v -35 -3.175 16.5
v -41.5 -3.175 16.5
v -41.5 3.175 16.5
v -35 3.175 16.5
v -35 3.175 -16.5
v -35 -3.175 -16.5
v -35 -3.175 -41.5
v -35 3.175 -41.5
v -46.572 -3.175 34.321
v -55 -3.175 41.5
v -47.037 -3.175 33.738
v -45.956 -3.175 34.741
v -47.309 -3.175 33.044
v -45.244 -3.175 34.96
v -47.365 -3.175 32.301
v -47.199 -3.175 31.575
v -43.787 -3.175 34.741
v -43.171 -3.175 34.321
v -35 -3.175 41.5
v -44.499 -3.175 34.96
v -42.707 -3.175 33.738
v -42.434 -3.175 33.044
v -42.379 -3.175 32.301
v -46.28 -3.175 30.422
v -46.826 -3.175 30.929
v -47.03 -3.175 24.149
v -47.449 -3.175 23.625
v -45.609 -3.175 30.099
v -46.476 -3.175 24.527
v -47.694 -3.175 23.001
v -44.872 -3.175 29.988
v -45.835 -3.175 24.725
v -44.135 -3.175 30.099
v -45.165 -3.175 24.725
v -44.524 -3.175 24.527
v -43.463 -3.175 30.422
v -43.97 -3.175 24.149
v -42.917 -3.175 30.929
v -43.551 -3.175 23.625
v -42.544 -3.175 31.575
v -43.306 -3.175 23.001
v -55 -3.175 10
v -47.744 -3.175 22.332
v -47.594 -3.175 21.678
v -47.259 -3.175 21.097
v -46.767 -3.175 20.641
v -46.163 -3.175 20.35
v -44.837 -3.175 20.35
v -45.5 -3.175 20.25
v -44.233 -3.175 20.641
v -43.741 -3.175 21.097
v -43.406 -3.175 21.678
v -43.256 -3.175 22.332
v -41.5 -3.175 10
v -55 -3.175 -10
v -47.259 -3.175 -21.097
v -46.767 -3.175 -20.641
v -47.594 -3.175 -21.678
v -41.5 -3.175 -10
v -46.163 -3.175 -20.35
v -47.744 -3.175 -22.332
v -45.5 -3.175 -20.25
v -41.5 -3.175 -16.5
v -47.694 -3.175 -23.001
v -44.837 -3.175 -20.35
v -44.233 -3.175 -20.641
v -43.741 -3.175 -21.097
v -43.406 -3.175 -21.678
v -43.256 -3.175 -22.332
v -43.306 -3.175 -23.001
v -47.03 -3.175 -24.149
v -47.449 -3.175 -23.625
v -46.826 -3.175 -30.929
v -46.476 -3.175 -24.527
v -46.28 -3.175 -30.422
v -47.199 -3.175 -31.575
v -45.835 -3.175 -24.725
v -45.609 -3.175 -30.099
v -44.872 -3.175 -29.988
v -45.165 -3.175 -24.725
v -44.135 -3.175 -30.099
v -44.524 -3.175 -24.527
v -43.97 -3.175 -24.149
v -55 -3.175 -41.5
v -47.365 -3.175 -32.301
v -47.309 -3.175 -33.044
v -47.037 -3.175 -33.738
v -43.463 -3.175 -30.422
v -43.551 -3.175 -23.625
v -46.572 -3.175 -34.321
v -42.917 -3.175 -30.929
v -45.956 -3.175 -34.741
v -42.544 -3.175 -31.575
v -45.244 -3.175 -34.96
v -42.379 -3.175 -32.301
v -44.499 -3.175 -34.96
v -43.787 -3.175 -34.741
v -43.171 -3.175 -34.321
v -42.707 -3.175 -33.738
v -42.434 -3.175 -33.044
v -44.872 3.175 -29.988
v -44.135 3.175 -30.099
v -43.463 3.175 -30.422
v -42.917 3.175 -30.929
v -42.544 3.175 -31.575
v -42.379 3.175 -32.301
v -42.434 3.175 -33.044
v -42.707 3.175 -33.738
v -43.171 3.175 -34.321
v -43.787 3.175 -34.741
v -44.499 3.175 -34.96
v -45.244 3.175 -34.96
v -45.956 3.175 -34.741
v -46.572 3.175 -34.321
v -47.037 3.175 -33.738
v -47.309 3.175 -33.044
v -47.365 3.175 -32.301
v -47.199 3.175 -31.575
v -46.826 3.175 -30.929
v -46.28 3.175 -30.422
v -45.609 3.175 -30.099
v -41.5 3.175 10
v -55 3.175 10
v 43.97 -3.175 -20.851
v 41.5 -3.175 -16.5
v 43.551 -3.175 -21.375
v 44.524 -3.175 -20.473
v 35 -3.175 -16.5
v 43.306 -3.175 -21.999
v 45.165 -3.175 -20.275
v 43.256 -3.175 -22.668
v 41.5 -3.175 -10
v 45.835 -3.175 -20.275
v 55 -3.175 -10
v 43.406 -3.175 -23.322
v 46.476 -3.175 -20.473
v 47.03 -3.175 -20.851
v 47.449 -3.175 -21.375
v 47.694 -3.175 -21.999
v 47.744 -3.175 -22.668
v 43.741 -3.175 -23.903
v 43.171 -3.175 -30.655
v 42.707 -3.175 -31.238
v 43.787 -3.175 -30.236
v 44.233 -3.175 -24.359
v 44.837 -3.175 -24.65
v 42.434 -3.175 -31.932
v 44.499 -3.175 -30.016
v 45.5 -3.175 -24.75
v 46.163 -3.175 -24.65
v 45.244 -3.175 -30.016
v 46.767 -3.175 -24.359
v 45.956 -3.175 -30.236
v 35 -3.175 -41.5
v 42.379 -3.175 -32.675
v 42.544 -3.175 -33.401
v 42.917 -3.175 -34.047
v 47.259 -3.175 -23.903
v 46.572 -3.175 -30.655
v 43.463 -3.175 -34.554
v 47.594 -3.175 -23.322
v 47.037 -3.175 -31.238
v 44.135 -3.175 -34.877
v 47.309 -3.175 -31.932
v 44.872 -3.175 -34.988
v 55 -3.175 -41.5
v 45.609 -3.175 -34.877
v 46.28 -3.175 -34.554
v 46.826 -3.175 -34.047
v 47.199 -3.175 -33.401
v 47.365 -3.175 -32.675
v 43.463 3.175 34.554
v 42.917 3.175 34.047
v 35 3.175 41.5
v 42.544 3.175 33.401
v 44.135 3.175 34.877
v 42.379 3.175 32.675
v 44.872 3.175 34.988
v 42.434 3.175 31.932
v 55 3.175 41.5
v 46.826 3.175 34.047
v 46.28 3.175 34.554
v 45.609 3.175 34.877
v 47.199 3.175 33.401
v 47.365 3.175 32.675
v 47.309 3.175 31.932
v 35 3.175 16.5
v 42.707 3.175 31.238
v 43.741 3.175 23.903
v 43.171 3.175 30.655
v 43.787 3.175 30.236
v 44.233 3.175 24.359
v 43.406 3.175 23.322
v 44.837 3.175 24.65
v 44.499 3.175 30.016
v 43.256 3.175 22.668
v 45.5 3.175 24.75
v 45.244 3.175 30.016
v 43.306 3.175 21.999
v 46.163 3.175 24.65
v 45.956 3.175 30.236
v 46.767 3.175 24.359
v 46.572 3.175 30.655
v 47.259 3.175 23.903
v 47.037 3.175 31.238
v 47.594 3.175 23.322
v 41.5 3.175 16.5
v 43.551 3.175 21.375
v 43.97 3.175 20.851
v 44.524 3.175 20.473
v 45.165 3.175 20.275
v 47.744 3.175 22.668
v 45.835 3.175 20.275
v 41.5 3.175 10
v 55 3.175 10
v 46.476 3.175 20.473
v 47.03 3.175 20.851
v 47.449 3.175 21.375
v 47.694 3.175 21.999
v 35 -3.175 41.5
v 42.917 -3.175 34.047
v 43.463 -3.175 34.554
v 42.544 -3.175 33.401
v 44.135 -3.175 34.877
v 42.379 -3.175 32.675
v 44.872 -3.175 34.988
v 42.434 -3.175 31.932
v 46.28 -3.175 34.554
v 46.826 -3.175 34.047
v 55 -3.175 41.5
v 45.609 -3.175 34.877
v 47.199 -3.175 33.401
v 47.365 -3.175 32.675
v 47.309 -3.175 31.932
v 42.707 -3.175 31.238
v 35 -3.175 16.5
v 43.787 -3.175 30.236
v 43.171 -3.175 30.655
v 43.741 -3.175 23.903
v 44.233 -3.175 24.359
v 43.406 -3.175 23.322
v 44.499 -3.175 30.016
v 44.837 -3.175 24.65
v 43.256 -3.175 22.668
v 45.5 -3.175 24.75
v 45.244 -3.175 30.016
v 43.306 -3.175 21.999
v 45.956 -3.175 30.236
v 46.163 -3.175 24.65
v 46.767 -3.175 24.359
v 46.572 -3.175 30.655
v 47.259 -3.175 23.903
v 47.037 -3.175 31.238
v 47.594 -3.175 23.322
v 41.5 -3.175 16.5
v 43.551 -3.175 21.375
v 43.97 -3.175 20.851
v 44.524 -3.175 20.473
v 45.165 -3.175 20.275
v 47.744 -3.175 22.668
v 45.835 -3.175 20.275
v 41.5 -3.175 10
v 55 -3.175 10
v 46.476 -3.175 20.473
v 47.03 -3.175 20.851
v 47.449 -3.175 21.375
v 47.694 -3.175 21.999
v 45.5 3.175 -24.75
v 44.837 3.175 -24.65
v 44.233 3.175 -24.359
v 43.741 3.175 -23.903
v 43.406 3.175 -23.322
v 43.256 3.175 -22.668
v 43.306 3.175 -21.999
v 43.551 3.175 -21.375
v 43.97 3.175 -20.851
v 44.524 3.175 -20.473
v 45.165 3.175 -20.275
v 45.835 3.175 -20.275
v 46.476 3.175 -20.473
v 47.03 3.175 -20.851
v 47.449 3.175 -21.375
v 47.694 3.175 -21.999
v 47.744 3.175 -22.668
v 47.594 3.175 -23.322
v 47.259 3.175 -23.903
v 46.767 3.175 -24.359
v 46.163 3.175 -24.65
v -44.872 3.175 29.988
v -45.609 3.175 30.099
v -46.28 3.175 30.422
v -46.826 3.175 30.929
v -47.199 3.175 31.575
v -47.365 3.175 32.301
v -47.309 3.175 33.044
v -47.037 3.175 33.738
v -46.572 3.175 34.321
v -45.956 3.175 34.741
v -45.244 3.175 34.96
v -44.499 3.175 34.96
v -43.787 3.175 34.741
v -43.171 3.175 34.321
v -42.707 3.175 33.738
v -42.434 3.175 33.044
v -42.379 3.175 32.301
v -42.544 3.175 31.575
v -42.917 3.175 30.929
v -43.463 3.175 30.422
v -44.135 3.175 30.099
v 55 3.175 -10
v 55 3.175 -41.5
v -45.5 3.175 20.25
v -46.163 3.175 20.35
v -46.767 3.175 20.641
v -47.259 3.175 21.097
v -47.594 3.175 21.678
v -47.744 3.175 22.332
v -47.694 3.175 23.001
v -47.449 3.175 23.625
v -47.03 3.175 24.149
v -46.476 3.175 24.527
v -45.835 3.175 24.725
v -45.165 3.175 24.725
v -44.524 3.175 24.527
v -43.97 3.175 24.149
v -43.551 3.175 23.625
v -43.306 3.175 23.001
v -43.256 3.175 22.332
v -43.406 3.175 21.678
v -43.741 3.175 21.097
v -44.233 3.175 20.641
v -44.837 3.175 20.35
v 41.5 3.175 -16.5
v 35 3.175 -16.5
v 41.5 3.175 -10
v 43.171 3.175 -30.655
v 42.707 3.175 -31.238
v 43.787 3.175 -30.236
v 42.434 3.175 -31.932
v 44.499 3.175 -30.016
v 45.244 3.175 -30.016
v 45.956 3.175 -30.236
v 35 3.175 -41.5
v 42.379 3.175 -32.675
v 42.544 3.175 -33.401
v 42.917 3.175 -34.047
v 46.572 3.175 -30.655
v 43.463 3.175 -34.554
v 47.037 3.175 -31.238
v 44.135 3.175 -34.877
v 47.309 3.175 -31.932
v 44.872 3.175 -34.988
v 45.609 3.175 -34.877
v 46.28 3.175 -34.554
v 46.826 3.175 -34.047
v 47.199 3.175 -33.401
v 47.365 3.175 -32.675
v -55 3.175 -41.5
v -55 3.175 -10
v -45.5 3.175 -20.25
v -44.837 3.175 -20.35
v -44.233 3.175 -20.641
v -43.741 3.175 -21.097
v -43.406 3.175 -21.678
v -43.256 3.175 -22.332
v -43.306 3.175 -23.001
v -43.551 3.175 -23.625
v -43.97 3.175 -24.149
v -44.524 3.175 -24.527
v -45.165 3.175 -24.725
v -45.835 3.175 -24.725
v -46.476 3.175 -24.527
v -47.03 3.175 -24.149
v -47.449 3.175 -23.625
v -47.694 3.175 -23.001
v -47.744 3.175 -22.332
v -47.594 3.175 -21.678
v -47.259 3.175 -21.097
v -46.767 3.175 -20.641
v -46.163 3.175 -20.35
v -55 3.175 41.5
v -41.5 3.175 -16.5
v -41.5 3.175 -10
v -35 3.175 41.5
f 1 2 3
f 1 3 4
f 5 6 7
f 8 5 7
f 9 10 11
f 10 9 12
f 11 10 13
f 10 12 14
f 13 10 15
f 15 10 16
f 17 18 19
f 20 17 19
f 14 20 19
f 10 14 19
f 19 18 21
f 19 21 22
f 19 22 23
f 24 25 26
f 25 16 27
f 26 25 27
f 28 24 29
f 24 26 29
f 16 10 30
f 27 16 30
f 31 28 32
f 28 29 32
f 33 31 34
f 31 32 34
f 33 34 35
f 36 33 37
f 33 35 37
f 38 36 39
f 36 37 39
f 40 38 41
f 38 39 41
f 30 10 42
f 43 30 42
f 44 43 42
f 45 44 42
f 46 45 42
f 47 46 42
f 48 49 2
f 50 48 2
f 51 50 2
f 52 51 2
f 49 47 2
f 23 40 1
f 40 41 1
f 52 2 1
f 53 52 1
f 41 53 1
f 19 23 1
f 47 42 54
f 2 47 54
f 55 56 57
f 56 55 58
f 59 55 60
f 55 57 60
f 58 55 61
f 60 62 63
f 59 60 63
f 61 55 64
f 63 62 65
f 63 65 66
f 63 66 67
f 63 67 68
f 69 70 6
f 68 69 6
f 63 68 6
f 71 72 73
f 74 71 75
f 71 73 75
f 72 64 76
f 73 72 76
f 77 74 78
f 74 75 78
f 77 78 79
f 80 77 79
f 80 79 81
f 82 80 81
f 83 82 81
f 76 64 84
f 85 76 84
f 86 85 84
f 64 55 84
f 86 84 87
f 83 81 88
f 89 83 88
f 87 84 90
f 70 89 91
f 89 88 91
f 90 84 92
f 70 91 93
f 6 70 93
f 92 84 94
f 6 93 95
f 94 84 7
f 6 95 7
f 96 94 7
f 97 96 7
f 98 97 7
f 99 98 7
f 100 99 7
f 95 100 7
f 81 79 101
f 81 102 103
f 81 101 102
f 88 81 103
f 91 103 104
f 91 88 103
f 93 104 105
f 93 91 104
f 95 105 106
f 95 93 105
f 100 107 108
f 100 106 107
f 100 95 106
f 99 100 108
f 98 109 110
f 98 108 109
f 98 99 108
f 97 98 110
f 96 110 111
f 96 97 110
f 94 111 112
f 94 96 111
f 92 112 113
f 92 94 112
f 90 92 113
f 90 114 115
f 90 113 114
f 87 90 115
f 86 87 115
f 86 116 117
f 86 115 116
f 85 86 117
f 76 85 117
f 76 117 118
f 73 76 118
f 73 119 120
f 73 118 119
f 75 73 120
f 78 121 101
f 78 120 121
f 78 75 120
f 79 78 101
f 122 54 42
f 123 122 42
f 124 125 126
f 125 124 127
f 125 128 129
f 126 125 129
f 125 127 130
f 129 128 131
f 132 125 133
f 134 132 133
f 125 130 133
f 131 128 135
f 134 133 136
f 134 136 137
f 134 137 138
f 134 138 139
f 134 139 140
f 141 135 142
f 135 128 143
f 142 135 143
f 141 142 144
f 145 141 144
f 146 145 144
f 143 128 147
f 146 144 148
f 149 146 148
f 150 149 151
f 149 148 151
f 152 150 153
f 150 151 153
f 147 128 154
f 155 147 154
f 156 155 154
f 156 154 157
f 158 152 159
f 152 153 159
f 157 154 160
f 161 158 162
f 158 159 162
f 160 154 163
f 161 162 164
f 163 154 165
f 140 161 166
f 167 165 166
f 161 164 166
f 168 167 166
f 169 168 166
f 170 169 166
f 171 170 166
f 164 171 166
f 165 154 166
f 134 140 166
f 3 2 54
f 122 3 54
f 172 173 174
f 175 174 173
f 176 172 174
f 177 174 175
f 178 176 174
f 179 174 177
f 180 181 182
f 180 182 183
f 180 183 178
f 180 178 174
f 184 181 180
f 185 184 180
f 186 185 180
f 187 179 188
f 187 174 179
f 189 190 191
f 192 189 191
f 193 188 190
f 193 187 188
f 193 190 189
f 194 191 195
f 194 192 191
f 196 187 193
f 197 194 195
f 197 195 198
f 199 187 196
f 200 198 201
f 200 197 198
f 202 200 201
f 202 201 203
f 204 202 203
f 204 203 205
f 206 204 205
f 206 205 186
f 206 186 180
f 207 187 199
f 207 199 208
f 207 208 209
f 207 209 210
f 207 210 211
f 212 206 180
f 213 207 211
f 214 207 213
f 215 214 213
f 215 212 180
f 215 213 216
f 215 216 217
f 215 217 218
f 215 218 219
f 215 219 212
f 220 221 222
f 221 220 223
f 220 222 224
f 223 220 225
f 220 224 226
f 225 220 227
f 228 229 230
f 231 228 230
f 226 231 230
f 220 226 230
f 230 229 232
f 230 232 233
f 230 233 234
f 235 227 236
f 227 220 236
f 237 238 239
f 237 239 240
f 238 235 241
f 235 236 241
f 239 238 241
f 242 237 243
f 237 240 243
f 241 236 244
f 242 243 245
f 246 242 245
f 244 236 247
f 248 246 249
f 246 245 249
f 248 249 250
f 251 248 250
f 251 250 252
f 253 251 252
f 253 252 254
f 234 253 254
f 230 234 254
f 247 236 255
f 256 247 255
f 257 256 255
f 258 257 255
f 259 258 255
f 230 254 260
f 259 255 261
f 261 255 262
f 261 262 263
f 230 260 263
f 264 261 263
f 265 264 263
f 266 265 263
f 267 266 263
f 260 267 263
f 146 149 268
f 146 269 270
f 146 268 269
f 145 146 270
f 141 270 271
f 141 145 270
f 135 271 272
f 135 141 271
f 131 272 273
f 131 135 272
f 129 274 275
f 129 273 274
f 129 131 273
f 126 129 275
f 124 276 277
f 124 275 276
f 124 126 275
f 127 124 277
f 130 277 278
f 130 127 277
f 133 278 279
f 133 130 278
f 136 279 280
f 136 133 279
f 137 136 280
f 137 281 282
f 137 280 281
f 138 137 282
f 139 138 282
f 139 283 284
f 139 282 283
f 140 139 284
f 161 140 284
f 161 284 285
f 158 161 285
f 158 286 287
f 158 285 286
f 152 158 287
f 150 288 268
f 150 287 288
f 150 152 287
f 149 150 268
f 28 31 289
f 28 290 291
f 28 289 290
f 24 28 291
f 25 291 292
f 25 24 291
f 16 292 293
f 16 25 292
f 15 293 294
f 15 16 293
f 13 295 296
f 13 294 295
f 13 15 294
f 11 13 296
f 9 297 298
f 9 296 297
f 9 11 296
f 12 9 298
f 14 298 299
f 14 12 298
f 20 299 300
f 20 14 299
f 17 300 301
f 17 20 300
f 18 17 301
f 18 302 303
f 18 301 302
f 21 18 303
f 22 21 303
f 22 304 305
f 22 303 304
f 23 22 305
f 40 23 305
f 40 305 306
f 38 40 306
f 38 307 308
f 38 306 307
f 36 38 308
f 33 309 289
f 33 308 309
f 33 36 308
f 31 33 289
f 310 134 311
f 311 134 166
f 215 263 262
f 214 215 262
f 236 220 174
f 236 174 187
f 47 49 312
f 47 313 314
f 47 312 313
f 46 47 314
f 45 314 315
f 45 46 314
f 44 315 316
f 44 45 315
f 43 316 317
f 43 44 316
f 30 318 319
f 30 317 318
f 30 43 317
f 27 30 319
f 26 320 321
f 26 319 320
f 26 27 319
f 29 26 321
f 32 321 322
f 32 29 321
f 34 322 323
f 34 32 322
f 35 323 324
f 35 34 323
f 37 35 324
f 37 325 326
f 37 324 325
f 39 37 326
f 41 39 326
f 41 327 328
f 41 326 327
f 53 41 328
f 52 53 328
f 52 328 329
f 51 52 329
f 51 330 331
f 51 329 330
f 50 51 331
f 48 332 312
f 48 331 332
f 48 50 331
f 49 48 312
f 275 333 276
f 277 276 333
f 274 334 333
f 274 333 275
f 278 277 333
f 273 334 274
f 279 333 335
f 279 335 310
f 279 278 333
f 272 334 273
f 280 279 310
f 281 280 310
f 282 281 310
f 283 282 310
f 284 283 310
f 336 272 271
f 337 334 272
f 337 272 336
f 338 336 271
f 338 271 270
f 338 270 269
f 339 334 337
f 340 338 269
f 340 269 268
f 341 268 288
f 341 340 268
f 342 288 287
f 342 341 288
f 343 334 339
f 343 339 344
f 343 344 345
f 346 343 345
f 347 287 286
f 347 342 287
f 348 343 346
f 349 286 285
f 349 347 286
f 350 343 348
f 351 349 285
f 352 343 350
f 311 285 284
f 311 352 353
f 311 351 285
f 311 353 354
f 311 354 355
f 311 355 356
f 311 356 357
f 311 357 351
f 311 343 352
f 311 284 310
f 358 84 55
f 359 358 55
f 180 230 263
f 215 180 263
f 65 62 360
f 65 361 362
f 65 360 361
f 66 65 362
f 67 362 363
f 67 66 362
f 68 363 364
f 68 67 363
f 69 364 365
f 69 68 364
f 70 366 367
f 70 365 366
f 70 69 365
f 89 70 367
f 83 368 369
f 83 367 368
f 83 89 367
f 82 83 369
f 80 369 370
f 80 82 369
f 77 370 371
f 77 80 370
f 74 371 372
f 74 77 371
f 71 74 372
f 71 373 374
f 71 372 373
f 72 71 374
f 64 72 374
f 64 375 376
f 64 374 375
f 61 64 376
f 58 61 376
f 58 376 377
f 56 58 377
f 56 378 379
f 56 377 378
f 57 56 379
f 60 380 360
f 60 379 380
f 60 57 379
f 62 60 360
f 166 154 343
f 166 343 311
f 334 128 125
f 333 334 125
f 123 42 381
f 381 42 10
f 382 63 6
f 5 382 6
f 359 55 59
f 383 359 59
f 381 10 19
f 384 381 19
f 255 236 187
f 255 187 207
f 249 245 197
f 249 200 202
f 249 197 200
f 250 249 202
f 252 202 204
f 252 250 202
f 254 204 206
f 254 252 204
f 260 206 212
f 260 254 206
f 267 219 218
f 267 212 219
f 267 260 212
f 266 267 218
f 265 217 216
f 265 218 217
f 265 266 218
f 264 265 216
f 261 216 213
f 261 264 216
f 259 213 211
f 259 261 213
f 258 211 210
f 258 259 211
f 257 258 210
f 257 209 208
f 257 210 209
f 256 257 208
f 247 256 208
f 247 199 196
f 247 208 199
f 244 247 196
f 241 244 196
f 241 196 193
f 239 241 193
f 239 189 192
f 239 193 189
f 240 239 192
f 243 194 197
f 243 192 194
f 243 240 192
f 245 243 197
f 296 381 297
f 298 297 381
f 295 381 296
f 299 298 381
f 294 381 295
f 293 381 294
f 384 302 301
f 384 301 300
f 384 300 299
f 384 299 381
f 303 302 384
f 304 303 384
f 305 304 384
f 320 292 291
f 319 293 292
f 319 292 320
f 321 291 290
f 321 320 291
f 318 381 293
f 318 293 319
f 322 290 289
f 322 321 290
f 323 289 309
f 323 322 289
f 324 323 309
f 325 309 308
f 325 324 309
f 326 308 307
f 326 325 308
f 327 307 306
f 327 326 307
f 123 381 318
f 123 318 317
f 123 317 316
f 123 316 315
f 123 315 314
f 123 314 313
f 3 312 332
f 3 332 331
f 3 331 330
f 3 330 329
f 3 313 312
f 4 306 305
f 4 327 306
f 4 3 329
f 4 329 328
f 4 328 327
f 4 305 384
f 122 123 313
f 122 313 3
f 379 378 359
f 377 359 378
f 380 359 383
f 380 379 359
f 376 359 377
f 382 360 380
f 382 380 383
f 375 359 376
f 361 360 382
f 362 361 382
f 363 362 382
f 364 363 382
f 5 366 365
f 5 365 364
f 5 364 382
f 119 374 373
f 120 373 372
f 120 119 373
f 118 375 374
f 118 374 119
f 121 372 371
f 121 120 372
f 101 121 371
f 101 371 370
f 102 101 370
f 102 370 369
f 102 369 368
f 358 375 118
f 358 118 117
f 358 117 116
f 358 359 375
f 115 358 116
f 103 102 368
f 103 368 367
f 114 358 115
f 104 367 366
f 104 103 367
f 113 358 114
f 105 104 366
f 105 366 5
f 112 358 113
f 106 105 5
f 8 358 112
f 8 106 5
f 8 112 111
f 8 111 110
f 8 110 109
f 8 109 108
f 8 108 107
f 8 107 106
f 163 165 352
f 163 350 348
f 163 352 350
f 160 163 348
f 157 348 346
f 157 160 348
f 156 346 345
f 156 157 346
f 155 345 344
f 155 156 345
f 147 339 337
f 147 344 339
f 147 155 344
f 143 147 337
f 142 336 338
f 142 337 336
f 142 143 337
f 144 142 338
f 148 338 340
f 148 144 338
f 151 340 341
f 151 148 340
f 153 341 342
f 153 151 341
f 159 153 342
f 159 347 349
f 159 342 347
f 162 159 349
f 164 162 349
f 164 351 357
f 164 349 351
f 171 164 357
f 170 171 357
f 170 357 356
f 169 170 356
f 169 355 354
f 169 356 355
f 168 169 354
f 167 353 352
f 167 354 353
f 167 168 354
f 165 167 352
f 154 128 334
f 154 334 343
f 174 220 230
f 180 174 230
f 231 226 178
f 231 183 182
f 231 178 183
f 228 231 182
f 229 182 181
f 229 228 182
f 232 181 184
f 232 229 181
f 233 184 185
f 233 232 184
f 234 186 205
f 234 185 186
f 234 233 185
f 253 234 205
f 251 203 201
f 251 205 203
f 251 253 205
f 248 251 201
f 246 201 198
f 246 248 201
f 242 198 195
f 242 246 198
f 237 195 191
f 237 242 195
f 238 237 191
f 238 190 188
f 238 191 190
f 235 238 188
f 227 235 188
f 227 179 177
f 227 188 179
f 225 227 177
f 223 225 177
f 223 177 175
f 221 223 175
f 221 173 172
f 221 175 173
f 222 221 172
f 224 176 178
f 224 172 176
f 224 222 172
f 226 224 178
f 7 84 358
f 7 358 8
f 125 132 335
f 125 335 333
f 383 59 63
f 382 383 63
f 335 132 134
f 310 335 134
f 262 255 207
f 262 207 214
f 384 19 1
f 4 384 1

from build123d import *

# Parameters (mm, degrees)
EXTRUDE_THIN1_DEPTH      = 3.175
EXTRUDE_THIN1_DEPTH_BACK = 3.175
SKETCH1_W                = 133
SKETCH1_H                = 83
SKETCH1_W_2              = 83
SKETCH1_H_2              = 33
CUT_EXTRUDE3_DEPTH       = 79.451135269
CUT_EXTRUDE3_DEPTH_BACK  = 79.451135269
SKETCH2_W                = 70
SKETCH2_H                = 100
CUT_EXTRUDE4_DEPTH       = 69.973405201
CUT_EXTRUDE4_DEPTH_BACK  = 69.973405201
SKETCH3_R                = 2.25
SKETCH3_R_2              = 2.5


with BuildPart() as part:
    # Sketch1 → Extrude-Thin1 (new, two sides: drawn at the far end of the back side and taken through both)
    with BuildSketch(Plane(origin=(0, 0, 0), x_dir=(1, 0, 0), z_dir=(0, 1, 0)).offset(-EXTRUDE_THIN1_DEPTH_BACK)):
        Rectangle(SKETCH1_W, SKETCH1_H)
        Rectangle(SKETCH1_W_2, SKETCH1_H_2, mode=Mode.SUBTRACT)
    extrude(amount=EXTRUDE_THIN1_DEPTH + EXTRUDE_THIN1_DEPTH_BACK)

    # Sketch2 → Cut-Extrude3 (cut, two sides: drawn at the far end of the back side and taken through both)
    with BuildSketch(Plane(origin=(0, 0, 0), x_dir=(1, 0, 0), z_dir=(0, 1, 0)).offset(-CUT_EXTRUDE3_DEPTH_BACK)):
        Polygon((-75, 10), (-66.5, 10), (-66.5, 41.5), (-55, 41.5), (-55, 10), (55, 10), (55, 41.5), (66.5, 41.5), (66.5, 10), (75, 10), (75, -10), (66.5, -10), (66.5, -41.5), (55, -41.5), (55, -10), (-55, -10), (-55, -41.5), (-66.5, -41.5), (-66.5, -10), (-75, -10), align=None)
        Rectangle(SKETCH2_W, SKETCH2_H)
    extrude(amount=CUT_EXTRUDE3_DEPTH + CUT_EXTRUDE3_DEPTH_BACK, mode=Mode.SUBTRACT)


with BuildPart() as cut_extrude3_piece_1:
    # of the separate pieces the step leaves, piece 1, a body of its own (cut_extrude3_pieces)
    add(part.part.solids().sort_by_distance((55, 3.175, 41.5))[0])


with BuildPart() as cut_extrude3_piece_2:
    # of the separate pieces the step leaves, piece 2, a body of its own (cut_extrude3_pieces)
    add(part.part.solids().sort_by_distance((41.5, -3.175, -10))[0])


with BuildPart() as cut_extrude3_piece_3:
    # of the separate pieces the step leaves, piece 3, a body of its own (cut_extrude3_pieces)
    add(part.part.solids().sort_by_distance((-55, -3.175, -41.5))[0])


with BuildPart() as cut_extrude3_piece_4:
    # of the separate pieces the step leaves, piece 4, a body of its own (cut_extrude3_pieces)
    add(part.part.solids().sort_by_distance((-35, -3.175, 41.5))[0])


with BuildPart() as cut_extrude4_tool:
    # Sketch3 → Cut-Extrude4 (new, two sides: drawn at the far end of the back side and taken through both)
    with BuildSketch(Plane(origin=(0, 0, 0), x_dir=(1, 0, 0), z_dir=(0, 1, 0)).offset(-CUT_EXTRUDE4_DEPTH_BACK)):
        with Locations(Location((-45.5, 22.5, 0), (0, 0, 270))):
            Circle(SKETCH3_R)
        with Locations(Location((45.5, 22.5, 0), (0, 0, 90))):
            Circle(SKETCH3_R)
        with Locations(Location((45.5, -22.5, 0), (0, 0, 270))):
            Circle(SKETCH3_R)
        with Locations(Location((-45.5, -22.5, 0), (0, 0, 90))):
            Circle(SKETCH3_R)
        with Locations(Location((-44.871622394, 32.488094285, 0), (0, 0, 270))):
            Circle(SKETCH3_R_2)
        with Locations(Location((-44.871622394, -32.488094285, 0), (0, 0, 90))):
            Circle(SKETCH3_R_2)
        with Locations(Location((44.871622394, -32.488094285, 0), (0, 0, 270))):
            Circle(SKETCH3_R_2)
        with Locations(Location((44.871622394, 32.488094285, 0), (0, 0, 90))):
            Circle(SKETCH3_R_2)
    extrude(amount=CUT_EXTRUDE4_DEPTH + CUT_EXTRUDE4_DEPTH_BACK)


with BuildPart() as cut_extrude3_piece_1_1:
    add(cut_extrude3_piece_1.part)

    # Cut-Extrude4: cut by cut_extrude4_tool
    add(cut_extrude4_tool.part, mode=Mode.SUBTRACT)


with BuildPart() as cut_extrude3_piece_2_1:
    add(cut_extrude3_piece_2.part)

    # Cut-Extrude4: cut by cut_extrude4_tool
    add(cut_extrude4_tool.part, mode=Mode.SUBTRACT)


with BuildPart() as cut_extrude3_piece_3_1:
    add(cut_extrude3_piece_3.part)

    # Cut-Extrude4: cut by cut_extrude4_tool
    add(cut_extrude4_tool.part, mode=Mode.SUBTRACT)


with BuildPart() as cut_extrude3_piece_4_1:
    add(cut_extrude3_piece_4.part)

    # Cut-Extrude4: cut by cut_extrude4_tool
    add(cut_extrude4_tool.part, mode=Mode.SUBTRACT)


solid = Compound([cut_extrude3_piece_1_1.part, cut_extrude3_piece_2_1.part, cut_extrude3_piece_3_1.part, cut_extrude3_piece_4_1.part])
